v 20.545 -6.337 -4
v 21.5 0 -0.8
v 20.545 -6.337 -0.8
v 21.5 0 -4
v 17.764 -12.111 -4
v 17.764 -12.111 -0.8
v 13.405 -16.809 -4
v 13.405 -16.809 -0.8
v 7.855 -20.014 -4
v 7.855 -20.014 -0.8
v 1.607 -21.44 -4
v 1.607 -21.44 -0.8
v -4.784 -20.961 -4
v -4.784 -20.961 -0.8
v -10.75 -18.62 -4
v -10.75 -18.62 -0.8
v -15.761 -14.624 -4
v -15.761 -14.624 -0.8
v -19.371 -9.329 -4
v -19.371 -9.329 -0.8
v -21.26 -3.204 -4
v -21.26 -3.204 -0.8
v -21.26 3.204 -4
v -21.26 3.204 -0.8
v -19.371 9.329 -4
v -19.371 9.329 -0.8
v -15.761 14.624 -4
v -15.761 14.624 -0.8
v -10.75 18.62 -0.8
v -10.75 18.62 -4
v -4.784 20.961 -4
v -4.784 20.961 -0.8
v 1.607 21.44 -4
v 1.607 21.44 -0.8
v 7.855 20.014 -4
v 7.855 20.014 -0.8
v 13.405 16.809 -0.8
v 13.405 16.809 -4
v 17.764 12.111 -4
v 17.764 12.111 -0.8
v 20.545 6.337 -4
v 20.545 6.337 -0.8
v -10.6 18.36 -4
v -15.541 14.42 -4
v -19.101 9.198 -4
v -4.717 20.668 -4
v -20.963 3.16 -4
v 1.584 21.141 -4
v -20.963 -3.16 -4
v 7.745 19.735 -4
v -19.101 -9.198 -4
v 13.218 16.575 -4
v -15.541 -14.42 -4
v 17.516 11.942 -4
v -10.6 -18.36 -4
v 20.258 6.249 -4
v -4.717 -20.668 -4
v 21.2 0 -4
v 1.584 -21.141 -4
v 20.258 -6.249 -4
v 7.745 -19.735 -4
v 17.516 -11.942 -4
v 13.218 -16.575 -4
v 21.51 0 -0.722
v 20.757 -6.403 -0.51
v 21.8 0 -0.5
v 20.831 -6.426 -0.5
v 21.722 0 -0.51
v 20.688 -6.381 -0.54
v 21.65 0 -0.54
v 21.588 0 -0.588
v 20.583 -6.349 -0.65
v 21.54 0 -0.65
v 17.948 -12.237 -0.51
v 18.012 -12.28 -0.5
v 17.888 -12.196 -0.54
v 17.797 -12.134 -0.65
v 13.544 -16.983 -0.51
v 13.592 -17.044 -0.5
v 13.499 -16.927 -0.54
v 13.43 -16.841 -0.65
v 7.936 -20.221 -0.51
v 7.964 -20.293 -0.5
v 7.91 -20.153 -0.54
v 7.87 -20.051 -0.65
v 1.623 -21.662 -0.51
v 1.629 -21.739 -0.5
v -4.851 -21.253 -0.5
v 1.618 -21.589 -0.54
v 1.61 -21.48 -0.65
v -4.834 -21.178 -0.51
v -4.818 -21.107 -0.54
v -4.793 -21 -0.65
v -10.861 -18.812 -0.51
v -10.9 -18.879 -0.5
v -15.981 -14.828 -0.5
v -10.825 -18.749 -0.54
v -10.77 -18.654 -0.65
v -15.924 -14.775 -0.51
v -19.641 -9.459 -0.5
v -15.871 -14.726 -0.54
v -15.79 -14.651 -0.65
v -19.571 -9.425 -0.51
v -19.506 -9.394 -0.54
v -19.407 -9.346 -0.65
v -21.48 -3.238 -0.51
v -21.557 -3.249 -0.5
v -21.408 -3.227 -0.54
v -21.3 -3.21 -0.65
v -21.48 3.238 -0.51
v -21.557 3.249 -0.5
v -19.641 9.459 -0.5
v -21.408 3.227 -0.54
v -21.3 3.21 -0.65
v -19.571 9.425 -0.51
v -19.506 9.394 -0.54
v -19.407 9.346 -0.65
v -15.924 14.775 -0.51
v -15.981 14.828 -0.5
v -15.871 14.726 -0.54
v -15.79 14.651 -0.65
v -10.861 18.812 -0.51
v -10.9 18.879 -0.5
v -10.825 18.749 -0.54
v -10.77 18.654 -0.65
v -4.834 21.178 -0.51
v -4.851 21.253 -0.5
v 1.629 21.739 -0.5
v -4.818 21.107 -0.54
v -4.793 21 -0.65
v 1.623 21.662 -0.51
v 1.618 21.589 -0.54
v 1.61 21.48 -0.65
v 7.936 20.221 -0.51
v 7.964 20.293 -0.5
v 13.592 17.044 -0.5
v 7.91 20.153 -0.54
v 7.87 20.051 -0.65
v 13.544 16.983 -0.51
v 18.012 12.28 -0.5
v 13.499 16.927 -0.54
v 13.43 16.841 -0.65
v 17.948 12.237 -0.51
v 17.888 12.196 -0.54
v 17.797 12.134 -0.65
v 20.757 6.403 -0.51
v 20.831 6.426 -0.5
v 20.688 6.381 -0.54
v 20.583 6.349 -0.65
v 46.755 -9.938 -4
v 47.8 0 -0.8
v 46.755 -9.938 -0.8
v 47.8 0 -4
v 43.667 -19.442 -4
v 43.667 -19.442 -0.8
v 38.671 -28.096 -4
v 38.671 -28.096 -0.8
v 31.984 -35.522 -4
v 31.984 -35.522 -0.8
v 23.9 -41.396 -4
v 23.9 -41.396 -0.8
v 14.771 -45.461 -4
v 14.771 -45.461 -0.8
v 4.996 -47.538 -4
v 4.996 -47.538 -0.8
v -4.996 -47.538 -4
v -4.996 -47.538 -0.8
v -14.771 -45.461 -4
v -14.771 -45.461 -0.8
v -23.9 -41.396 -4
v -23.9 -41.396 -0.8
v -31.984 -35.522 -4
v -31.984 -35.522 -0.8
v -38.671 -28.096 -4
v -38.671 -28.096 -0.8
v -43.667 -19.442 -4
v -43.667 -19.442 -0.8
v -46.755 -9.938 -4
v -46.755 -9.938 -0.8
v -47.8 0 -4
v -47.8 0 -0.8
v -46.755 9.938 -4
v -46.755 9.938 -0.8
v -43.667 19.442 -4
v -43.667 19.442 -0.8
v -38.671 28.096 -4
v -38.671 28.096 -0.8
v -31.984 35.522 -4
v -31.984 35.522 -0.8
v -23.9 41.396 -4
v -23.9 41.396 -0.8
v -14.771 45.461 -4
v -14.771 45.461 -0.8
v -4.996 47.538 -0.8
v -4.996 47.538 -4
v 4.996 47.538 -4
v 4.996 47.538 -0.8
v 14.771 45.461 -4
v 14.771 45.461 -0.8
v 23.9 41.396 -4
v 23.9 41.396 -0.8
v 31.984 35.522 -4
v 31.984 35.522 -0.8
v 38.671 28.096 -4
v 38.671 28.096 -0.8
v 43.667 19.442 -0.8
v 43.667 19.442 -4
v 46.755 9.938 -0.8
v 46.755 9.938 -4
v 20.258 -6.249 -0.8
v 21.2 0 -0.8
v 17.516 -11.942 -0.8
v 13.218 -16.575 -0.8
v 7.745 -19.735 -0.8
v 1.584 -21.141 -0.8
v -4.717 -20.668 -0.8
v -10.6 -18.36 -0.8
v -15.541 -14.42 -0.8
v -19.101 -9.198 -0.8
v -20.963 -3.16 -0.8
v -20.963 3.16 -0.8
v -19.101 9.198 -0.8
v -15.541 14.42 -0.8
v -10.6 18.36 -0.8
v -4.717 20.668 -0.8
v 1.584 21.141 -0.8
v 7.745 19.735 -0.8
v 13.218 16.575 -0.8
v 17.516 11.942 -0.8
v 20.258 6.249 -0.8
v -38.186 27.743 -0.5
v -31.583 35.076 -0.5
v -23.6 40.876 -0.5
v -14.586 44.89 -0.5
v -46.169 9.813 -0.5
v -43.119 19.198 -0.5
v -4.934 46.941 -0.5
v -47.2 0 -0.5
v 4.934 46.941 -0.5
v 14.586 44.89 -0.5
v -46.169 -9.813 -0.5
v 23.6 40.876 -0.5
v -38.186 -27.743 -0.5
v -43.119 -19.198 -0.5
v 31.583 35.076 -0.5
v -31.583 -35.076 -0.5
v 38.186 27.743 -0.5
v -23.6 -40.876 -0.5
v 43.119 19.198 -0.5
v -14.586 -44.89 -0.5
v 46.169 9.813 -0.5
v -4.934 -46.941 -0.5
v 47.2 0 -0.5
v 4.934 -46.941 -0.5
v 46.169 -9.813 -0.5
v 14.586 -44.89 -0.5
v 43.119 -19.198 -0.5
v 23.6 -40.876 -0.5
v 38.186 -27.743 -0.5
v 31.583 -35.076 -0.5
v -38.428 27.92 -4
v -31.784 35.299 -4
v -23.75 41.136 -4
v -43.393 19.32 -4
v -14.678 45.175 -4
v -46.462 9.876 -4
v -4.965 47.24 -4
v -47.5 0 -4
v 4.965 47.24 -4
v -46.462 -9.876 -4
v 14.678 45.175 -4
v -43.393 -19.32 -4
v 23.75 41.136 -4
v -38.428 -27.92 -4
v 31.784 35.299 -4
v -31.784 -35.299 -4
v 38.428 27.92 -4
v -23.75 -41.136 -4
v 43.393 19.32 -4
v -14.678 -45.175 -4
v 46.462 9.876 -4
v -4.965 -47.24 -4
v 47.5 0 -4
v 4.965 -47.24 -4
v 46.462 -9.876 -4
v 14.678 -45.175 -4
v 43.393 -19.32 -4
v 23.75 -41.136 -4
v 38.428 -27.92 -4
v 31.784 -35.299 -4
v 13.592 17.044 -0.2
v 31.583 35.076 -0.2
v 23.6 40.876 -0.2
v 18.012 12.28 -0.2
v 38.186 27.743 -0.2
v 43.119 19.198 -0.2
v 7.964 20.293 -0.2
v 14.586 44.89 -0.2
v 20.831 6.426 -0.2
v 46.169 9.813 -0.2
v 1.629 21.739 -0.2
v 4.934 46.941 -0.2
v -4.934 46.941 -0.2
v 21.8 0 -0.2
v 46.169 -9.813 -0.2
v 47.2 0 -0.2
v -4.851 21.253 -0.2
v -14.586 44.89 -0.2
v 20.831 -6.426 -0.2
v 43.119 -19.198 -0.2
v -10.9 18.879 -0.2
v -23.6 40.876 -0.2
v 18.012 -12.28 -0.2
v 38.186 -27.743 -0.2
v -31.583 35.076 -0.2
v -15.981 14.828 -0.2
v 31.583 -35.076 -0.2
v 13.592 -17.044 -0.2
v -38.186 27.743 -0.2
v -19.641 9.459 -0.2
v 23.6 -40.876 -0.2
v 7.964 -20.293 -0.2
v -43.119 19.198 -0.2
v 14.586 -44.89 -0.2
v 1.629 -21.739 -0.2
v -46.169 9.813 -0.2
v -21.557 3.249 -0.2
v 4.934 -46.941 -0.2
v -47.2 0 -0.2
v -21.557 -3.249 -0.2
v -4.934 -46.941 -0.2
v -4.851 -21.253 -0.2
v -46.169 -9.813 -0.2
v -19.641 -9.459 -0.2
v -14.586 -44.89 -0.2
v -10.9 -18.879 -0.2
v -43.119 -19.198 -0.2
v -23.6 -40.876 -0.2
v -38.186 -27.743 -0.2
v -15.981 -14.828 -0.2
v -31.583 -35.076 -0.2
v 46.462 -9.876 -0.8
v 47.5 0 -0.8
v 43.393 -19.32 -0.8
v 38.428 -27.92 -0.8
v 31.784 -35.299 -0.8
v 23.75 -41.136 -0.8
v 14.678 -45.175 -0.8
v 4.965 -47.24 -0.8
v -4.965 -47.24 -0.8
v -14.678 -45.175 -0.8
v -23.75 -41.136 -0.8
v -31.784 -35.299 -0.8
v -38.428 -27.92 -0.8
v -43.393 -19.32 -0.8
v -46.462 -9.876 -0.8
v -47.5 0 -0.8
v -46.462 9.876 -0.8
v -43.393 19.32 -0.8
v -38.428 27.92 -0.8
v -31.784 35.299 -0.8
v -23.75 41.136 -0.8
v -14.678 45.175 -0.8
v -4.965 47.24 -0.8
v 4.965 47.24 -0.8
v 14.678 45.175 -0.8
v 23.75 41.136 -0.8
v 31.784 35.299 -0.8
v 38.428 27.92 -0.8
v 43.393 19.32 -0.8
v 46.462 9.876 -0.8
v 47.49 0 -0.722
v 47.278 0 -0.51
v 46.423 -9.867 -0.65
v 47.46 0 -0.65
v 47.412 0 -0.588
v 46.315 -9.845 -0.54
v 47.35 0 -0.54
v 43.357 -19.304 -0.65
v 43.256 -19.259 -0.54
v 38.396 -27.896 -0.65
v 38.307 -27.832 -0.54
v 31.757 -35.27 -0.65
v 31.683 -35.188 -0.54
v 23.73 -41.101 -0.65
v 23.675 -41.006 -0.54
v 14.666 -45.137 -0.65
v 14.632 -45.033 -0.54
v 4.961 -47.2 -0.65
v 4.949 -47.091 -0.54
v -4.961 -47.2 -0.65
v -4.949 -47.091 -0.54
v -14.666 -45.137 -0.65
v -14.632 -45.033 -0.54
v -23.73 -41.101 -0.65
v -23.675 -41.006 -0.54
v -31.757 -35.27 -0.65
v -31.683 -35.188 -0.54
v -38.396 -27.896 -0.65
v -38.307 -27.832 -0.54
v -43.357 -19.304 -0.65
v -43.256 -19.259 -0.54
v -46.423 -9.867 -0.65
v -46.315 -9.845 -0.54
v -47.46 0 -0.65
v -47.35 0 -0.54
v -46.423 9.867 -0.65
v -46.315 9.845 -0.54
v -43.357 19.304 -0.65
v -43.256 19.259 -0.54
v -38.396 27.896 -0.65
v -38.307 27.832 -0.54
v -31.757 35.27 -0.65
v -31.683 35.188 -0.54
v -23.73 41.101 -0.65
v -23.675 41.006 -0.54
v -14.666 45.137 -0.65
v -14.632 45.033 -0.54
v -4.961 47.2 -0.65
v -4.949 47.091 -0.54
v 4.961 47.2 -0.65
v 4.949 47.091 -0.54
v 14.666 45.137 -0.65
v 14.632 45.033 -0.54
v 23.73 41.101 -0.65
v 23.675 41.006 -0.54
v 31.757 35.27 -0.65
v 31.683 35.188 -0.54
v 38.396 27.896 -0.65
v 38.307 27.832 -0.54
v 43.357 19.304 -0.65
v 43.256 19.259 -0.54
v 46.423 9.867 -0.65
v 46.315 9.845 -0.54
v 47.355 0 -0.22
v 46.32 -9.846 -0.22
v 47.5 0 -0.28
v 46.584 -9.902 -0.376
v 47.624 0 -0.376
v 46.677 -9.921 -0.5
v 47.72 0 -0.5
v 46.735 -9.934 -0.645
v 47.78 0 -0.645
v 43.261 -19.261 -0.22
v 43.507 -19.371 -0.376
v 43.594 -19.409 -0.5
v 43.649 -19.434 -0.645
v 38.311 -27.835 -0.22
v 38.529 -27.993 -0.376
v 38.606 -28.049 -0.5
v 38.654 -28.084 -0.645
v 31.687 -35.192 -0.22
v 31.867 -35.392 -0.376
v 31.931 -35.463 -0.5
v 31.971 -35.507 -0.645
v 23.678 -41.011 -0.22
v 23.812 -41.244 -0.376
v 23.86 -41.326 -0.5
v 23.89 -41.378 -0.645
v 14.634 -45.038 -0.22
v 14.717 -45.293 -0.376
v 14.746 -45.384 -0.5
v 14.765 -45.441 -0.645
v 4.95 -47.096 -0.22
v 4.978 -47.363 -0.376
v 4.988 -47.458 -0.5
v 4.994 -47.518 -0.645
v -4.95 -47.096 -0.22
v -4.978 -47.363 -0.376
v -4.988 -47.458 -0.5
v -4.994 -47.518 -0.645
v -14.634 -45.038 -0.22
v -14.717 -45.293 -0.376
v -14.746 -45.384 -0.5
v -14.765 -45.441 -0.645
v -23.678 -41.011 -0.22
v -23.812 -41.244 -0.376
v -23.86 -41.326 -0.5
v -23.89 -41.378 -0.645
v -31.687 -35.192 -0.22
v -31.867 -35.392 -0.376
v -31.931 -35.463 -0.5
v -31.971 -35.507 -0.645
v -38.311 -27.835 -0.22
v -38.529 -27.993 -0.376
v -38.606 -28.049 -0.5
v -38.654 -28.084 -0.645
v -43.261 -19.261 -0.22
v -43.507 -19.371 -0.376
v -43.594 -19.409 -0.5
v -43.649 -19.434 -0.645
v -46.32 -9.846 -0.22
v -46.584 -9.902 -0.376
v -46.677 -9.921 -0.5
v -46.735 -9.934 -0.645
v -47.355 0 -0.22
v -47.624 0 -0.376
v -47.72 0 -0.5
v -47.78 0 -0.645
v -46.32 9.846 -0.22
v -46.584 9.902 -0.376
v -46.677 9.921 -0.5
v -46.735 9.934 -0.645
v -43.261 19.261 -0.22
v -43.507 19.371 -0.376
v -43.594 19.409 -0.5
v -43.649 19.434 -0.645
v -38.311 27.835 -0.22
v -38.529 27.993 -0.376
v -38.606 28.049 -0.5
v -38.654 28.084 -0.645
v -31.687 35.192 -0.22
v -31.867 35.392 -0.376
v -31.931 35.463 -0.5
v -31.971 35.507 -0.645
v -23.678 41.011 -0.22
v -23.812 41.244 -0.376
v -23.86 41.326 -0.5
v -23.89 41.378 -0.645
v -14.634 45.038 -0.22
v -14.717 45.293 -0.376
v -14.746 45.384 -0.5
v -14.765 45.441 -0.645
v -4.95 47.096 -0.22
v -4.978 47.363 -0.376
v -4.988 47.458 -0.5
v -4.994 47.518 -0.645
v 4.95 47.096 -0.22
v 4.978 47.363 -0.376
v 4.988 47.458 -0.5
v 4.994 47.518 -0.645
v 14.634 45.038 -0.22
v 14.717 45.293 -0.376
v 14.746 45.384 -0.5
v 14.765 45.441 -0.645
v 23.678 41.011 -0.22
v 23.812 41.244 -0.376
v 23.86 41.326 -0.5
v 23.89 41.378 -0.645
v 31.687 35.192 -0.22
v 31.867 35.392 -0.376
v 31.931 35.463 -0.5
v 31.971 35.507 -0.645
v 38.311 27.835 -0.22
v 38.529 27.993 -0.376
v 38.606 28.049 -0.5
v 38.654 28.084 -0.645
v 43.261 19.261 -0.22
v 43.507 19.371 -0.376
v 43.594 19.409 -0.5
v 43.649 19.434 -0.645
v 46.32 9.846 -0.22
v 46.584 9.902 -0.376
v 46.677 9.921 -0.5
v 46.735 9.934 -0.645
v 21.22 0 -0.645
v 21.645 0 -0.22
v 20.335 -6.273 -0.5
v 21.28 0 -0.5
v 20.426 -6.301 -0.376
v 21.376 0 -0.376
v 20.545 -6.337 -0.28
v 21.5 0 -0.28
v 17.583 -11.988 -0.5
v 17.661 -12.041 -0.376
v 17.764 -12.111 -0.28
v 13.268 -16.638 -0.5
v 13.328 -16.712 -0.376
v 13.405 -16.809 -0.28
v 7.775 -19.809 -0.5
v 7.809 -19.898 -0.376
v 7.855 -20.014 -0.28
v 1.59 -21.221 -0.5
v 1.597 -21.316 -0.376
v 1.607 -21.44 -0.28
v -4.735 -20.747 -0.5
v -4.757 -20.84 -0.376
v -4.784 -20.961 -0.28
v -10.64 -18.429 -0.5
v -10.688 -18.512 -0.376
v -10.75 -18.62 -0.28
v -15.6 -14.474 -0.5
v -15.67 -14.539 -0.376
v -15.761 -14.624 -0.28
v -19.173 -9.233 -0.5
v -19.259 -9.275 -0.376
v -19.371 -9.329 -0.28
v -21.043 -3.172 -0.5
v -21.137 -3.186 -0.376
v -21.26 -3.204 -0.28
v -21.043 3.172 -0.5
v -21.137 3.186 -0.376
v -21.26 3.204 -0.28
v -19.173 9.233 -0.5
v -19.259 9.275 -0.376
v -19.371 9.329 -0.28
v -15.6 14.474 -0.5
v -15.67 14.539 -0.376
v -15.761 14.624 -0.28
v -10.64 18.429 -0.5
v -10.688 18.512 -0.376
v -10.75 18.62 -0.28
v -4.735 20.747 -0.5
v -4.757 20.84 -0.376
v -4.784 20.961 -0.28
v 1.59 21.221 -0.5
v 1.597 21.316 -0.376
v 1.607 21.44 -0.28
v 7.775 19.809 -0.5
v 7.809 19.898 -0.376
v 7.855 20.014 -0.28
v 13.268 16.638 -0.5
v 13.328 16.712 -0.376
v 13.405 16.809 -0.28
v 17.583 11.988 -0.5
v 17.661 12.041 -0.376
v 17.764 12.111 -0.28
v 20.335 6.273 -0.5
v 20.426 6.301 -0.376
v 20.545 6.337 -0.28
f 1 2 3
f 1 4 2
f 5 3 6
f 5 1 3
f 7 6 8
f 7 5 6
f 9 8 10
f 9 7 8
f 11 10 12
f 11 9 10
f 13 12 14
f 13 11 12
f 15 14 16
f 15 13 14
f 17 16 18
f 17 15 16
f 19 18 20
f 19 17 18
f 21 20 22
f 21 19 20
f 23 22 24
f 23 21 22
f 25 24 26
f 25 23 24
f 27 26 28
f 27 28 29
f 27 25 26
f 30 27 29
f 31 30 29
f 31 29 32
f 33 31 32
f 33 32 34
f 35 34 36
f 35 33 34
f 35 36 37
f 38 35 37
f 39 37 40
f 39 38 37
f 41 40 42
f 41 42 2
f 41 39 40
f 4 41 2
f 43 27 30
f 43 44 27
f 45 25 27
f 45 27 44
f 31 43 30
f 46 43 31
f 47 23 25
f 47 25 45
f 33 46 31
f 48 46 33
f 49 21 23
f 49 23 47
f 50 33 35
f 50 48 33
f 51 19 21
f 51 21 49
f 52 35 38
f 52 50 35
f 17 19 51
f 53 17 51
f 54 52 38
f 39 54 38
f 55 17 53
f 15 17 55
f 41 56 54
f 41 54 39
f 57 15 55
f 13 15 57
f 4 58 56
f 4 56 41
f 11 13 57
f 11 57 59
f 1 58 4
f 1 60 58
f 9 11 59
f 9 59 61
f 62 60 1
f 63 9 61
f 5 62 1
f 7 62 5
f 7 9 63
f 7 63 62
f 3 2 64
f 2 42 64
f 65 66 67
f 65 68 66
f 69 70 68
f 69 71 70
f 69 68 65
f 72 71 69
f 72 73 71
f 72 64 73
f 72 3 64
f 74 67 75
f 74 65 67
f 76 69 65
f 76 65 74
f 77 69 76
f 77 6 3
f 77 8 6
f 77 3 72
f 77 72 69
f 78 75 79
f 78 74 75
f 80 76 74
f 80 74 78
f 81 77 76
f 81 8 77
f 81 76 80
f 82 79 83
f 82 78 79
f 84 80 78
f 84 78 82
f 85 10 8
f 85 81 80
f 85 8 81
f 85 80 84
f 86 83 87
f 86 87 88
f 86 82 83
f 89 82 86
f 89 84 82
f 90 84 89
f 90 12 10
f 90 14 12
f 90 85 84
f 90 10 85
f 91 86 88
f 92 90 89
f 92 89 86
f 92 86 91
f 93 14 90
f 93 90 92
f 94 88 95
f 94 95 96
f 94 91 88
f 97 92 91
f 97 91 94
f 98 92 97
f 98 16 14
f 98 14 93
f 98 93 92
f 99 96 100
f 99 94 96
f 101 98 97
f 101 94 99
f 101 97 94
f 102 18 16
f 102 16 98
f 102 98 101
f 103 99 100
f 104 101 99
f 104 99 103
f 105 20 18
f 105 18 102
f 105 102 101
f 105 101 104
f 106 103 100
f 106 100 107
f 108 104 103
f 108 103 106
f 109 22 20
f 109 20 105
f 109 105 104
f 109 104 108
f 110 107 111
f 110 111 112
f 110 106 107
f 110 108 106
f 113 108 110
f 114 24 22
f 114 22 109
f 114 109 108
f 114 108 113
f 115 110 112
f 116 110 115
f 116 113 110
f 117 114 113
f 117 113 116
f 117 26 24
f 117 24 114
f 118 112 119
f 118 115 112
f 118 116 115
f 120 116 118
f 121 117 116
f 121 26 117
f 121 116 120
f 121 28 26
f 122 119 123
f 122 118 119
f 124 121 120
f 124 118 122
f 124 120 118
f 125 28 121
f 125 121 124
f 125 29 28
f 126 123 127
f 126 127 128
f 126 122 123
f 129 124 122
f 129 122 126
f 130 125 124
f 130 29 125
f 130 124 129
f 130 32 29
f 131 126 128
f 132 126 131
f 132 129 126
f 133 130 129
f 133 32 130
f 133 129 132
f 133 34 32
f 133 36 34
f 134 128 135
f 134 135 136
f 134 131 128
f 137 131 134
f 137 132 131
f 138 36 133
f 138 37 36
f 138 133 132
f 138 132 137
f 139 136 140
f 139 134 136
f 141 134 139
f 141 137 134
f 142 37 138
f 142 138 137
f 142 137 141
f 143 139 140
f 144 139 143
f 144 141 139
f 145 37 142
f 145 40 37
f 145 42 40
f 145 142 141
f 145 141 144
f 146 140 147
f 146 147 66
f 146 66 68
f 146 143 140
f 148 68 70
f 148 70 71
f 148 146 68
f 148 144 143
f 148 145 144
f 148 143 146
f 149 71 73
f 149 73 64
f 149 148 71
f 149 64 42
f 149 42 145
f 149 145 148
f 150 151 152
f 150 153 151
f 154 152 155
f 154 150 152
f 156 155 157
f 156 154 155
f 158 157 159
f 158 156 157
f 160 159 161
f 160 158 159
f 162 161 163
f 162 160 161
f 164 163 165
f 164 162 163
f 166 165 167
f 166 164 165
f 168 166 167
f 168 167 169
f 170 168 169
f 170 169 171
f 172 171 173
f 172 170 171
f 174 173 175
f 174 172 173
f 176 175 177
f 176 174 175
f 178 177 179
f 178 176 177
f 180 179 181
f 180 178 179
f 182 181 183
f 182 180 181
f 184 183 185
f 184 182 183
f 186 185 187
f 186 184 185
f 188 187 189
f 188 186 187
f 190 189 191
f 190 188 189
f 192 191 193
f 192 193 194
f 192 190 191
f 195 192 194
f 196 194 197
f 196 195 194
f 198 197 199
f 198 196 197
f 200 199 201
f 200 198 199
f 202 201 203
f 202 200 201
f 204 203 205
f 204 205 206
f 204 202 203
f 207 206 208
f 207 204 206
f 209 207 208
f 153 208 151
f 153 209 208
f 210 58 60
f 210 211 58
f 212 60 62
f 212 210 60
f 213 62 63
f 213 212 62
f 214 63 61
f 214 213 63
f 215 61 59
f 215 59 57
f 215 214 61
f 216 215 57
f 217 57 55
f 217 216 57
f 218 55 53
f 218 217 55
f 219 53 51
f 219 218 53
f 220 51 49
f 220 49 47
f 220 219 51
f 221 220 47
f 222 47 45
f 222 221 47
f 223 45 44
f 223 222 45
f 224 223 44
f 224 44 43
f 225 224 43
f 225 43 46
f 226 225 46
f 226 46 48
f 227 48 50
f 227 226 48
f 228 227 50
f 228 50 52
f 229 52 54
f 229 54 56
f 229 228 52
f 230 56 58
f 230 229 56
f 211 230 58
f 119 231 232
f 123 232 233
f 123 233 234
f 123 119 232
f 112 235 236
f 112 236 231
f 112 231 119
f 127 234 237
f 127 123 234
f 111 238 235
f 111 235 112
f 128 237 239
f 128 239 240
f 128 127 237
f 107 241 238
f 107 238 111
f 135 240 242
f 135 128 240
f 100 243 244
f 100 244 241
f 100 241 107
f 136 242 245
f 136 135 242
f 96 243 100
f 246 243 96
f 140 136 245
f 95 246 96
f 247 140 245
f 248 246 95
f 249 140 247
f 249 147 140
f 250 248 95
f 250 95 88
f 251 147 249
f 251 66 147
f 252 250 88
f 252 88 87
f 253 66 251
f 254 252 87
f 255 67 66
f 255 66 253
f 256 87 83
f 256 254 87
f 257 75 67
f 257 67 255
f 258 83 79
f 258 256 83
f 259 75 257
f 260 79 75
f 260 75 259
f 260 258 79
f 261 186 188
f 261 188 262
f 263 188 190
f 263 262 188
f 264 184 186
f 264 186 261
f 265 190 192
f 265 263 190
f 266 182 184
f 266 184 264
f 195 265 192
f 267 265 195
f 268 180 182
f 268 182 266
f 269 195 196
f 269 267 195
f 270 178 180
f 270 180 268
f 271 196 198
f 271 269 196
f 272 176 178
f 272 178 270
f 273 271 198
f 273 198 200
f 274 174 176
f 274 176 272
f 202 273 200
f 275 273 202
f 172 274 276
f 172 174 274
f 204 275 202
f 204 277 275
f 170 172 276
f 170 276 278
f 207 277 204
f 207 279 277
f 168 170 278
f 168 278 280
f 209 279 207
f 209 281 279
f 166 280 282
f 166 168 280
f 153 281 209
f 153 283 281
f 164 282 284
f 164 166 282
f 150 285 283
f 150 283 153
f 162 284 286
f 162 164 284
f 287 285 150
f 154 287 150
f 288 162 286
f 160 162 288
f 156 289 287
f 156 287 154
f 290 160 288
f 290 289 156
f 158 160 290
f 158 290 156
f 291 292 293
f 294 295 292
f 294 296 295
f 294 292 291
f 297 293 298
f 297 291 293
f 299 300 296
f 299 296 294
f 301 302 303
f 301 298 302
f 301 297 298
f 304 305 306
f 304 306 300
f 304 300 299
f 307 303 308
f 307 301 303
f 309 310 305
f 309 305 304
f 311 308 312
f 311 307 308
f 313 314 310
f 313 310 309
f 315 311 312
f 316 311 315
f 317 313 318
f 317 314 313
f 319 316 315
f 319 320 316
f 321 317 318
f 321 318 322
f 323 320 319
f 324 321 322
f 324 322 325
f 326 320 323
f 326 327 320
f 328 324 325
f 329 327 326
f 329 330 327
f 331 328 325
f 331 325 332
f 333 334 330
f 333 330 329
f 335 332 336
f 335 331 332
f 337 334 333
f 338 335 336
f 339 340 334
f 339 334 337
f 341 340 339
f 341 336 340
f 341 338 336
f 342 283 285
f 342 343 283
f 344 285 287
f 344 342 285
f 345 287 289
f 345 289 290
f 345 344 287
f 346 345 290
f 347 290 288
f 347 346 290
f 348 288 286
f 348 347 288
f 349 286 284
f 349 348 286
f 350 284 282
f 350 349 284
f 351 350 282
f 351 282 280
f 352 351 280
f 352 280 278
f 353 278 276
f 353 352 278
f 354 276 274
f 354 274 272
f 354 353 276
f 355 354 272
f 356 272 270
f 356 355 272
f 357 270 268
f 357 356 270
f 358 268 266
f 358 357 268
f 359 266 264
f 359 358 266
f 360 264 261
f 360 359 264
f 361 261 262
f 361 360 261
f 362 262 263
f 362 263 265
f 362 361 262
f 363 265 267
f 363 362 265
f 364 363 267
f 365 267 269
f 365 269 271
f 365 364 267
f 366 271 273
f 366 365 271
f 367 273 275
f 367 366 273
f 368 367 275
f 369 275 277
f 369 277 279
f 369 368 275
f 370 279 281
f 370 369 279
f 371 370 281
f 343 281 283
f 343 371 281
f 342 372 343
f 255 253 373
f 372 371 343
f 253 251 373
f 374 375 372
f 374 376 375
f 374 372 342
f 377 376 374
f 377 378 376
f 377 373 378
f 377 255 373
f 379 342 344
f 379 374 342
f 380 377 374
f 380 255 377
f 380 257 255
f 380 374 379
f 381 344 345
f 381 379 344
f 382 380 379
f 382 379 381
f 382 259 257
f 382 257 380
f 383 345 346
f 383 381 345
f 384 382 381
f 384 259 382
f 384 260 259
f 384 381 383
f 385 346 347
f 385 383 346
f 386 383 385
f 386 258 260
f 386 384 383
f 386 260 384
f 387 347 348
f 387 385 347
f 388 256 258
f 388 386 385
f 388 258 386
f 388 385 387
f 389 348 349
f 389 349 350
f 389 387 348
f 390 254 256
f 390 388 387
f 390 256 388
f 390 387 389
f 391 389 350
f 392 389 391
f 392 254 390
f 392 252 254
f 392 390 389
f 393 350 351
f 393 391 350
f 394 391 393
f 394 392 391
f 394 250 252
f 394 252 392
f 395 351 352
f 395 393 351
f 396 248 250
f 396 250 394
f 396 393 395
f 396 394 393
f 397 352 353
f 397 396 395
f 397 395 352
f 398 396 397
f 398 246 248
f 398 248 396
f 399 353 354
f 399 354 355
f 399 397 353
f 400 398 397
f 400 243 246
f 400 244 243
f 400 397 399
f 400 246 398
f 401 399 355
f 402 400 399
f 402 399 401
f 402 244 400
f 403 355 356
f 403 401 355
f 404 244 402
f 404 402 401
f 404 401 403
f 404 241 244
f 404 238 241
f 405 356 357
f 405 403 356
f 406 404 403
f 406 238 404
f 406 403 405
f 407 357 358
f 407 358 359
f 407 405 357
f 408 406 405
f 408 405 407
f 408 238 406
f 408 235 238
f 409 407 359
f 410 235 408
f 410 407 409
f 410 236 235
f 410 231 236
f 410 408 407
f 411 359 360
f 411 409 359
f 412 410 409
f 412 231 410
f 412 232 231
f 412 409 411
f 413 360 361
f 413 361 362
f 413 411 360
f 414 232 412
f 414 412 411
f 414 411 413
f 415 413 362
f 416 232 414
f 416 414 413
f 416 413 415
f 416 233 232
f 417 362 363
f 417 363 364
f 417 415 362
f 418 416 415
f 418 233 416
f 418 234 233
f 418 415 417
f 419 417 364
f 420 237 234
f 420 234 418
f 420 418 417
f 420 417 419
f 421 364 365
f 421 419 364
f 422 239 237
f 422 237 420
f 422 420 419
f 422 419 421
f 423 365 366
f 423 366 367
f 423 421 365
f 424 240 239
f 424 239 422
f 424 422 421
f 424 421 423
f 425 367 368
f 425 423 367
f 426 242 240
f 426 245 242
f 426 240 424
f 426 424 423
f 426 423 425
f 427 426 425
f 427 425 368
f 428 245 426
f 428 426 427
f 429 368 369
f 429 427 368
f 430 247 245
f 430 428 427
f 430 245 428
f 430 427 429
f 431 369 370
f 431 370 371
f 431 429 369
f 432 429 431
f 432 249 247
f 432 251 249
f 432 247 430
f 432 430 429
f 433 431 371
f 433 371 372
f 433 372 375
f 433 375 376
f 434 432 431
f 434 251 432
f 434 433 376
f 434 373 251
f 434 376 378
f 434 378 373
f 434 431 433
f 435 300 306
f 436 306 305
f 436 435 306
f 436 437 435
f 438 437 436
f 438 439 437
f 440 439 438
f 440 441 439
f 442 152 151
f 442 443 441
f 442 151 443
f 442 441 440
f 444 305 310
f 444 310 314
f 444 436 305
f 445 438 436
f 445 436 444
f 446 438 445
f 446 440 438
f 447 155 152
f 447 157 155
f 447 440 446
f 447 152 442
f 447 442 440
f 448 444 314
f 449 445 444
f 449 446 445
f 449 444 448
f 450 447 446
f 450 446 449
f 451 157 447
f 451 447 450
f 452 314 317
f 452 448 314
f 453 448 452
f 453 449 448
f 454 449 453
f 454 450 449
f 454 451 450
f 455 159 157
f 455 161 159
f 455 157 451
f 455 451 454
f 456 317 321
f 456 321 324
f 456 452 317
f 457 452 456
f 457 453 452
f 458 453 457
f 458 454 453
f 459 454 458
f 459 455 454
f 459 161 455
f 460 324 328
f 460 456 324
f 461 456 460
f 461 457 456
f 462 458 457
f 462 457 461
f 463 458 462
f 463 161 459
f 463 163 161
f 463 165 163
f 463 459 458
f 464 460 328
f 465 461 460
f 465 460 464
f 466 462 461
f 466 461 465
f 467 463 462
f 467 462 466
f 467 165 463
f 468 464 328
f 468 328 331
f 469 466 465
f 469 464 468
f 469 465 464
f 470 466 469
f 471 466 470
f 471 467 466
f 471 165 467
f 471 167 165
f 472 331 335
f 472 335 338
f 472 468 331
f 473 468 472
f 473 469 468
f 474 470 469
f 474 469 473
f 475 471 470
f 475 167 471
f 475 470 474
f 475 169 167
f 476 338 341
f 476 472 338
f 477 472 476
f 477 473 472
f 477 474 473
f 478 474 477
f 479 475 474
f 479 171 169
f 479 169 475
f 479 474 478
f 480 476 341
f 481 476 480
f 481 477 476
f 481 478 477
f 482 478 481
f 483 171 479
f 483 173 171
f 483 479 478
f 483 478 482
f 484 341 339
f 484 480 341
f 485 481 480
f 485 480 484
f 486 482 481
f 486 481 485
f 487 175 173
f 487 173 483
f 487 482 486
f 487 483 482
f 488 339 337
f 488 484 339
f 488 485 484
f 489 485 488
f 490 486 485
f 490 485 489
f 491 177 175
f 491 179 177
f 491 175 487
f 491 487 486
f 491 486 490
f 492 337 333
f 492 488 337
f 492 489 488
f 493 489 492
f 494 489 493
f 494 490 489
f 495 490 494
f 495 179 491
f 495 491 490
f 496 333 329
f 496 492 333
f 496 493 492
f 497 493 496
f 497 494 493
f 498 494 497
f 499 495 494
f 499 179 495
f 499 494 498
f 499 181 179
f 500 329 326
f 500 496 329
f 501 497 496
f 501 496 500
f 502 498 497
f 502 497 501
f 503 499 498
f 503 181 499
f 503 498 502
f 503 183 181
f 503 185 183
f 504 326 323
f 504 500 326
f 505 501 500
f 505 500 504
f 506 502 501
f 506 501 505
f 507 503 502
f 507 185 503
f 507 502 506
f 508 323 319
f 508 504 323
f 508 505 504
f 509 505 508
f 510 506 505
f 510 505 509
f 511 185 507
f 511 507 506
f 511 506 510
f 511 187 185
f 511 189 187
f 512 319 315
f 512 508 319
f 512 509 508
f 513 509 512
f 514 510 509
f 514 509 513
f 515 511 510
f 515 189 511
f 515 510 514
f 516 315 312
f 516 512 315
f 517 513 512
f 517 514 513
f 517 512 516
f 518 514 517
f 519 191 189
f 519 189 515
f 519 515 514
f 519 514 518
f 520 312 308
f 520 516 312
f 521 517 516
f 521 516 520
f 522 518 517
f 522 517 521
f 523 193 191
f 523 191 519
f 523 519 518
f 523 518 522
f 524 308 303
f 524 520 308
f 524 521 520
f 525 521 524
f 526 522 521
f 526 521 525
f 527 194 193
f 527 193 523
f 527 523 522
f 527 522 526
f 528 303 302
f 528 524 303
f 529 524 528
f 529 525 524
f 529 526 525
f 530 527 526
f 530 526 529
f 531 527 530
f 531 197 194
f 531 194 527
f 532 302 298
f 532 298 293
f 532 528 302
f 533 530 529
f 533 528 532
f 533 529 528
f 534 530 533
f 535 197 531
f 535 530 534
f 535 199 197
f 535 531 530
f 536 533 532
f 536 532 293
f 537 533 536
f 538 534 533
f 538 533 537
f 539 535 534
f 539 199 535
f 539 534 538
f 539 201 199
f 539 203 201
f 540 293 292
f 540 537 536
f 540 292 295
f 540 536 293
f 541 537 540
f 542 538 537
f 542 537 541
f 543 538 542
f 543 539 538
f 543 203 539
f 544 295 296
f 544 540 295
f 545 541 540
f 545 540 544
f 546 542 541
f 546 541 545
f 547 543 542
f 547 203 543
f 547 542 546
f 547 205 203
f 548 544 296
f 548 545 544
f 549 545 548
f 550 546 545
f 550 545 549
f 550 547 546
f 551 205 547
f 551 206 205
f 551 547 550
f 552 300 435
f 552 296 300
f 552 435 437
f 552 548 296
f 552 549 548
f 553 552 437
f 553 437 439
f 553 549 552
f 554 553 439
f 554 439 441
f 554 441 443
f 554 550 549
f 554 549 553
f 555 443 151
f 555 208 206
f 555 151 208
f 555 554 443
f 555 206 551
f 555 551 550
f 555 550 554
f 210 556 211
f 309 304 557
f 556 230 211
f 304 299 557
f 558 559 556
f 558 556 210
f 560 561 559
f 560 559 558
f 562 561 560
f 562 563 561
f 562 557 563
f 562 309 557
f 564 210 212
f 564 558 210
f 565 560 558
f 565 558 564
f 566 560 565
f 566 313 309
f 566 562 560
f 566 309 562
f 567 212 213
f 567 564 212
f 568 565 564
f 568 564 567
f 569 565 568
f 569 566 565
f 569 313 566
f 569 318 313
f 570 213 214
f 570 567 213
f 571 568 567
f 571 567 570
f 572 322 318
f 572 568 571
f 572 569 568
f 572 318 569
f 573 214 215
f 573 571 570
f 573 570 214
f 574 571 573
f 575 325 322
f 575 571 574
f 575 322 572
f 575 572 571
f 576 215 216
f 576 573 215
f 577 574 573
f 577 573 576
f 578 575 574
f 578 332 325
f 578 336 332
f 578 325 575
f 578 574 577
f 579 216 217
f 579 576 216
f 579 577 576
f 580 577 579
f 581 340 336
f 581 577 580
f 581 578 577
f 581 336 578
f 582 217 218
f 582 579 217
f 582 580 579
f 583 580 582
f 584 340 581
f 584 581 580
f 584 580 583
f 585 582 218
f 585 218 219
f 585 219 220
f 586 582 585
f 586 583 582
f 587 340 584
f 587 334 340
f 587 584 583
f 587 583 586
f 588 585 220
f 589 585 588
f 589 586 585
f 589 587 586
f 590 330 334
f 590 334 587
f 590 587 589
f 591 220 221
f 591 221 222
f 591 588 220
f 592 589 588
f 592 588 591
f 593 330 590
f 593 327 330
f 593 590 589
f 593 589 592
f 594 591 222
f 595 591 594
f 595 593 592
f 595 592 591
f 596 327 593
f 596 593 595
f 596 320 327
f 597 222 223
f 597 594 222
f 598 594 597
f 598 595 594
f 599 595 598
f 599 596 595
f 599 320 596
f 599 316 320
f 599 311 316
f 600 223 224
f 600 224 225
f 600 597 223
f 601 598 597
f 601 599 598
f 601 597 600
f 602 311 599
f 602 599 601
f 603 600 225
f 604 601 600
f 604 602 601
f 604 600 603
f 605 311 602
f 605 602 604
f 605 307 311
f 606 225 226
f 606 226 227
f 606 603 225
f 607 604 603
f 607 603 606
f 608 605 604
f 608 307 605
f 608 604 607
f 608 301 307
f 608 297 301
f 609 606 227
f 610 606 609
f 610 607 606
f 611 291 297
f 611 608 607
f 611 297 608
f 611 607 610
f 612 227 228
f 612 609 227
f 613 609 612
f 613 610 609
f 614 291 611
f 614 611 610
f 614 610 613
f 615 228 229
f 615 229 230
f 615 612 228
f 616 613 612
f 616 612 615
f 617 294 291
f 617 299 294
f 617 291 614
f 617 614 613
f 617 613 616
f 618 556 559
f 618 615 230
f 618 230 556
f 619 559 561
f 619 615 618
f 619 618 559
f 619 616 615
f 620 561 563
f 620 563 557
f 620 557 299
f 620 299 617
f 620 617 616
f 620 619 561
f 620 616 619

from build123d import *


with BuildPart() as part:
    # Sketch1 → Revolve1 (revolve)
    with BuildSketch(Plane(origin=(0, 0, 0), x_dir=(1, 0, 0), z_dir=(0, 1, 0)), mode=Mode.PRIVATE) as revolve1_sk:
        with BuildLine():
            Line((-47.5, 1.5), (-47.5, 0.8))
            ThreePointArc((-47.5, 0.8), (-47.412132034, 0.587867966), (-47.2, 0.5))
            Line((-47.2, 0.5), (-46.5, 0.5))
            Line((-46.5, 0.5), (-22.5, 0.5))
            Line((-22.5, 0.5), (-21.8, 0.5))
            ThreePointArc((-21.8, 0.5), (-21.587867966, 0.587867966), (-21.5, 0.8))
            Line((-21.5, 0.8), (-21.5, 1.5))
            Line((-21.5, 1.5), (-21.5, 4))
            Line((-21.5, 4), (-21.2, 4))
            Line((-21.2, 4), (-21.2, 0.8))
            ThreePointArc((-21.2, 0.8), (-21.375735931, 0.375735931), (-21.8, 0.2))
            Line((-21.8, 0.2), (-47.2, 0.2))
            ThreePointArc((-47.2, 0.2), (-47.624264069, 0.375735931), (-47.8, 0.8))
            Line((-47.8, 0.8), (-47.8, 4))
            Line((-47.8, 4), (-47.5, 4))
            Line((-47.5, 4), (-47.5, 1.5))
        make_face()
    revolve(revolve1_sk.sketch.rotate(Axis((0, 0, 0), (0, 0, -1)), 180), axis=Axis((0, 0, 0), (0, 0, -1)))


solid = part.part
